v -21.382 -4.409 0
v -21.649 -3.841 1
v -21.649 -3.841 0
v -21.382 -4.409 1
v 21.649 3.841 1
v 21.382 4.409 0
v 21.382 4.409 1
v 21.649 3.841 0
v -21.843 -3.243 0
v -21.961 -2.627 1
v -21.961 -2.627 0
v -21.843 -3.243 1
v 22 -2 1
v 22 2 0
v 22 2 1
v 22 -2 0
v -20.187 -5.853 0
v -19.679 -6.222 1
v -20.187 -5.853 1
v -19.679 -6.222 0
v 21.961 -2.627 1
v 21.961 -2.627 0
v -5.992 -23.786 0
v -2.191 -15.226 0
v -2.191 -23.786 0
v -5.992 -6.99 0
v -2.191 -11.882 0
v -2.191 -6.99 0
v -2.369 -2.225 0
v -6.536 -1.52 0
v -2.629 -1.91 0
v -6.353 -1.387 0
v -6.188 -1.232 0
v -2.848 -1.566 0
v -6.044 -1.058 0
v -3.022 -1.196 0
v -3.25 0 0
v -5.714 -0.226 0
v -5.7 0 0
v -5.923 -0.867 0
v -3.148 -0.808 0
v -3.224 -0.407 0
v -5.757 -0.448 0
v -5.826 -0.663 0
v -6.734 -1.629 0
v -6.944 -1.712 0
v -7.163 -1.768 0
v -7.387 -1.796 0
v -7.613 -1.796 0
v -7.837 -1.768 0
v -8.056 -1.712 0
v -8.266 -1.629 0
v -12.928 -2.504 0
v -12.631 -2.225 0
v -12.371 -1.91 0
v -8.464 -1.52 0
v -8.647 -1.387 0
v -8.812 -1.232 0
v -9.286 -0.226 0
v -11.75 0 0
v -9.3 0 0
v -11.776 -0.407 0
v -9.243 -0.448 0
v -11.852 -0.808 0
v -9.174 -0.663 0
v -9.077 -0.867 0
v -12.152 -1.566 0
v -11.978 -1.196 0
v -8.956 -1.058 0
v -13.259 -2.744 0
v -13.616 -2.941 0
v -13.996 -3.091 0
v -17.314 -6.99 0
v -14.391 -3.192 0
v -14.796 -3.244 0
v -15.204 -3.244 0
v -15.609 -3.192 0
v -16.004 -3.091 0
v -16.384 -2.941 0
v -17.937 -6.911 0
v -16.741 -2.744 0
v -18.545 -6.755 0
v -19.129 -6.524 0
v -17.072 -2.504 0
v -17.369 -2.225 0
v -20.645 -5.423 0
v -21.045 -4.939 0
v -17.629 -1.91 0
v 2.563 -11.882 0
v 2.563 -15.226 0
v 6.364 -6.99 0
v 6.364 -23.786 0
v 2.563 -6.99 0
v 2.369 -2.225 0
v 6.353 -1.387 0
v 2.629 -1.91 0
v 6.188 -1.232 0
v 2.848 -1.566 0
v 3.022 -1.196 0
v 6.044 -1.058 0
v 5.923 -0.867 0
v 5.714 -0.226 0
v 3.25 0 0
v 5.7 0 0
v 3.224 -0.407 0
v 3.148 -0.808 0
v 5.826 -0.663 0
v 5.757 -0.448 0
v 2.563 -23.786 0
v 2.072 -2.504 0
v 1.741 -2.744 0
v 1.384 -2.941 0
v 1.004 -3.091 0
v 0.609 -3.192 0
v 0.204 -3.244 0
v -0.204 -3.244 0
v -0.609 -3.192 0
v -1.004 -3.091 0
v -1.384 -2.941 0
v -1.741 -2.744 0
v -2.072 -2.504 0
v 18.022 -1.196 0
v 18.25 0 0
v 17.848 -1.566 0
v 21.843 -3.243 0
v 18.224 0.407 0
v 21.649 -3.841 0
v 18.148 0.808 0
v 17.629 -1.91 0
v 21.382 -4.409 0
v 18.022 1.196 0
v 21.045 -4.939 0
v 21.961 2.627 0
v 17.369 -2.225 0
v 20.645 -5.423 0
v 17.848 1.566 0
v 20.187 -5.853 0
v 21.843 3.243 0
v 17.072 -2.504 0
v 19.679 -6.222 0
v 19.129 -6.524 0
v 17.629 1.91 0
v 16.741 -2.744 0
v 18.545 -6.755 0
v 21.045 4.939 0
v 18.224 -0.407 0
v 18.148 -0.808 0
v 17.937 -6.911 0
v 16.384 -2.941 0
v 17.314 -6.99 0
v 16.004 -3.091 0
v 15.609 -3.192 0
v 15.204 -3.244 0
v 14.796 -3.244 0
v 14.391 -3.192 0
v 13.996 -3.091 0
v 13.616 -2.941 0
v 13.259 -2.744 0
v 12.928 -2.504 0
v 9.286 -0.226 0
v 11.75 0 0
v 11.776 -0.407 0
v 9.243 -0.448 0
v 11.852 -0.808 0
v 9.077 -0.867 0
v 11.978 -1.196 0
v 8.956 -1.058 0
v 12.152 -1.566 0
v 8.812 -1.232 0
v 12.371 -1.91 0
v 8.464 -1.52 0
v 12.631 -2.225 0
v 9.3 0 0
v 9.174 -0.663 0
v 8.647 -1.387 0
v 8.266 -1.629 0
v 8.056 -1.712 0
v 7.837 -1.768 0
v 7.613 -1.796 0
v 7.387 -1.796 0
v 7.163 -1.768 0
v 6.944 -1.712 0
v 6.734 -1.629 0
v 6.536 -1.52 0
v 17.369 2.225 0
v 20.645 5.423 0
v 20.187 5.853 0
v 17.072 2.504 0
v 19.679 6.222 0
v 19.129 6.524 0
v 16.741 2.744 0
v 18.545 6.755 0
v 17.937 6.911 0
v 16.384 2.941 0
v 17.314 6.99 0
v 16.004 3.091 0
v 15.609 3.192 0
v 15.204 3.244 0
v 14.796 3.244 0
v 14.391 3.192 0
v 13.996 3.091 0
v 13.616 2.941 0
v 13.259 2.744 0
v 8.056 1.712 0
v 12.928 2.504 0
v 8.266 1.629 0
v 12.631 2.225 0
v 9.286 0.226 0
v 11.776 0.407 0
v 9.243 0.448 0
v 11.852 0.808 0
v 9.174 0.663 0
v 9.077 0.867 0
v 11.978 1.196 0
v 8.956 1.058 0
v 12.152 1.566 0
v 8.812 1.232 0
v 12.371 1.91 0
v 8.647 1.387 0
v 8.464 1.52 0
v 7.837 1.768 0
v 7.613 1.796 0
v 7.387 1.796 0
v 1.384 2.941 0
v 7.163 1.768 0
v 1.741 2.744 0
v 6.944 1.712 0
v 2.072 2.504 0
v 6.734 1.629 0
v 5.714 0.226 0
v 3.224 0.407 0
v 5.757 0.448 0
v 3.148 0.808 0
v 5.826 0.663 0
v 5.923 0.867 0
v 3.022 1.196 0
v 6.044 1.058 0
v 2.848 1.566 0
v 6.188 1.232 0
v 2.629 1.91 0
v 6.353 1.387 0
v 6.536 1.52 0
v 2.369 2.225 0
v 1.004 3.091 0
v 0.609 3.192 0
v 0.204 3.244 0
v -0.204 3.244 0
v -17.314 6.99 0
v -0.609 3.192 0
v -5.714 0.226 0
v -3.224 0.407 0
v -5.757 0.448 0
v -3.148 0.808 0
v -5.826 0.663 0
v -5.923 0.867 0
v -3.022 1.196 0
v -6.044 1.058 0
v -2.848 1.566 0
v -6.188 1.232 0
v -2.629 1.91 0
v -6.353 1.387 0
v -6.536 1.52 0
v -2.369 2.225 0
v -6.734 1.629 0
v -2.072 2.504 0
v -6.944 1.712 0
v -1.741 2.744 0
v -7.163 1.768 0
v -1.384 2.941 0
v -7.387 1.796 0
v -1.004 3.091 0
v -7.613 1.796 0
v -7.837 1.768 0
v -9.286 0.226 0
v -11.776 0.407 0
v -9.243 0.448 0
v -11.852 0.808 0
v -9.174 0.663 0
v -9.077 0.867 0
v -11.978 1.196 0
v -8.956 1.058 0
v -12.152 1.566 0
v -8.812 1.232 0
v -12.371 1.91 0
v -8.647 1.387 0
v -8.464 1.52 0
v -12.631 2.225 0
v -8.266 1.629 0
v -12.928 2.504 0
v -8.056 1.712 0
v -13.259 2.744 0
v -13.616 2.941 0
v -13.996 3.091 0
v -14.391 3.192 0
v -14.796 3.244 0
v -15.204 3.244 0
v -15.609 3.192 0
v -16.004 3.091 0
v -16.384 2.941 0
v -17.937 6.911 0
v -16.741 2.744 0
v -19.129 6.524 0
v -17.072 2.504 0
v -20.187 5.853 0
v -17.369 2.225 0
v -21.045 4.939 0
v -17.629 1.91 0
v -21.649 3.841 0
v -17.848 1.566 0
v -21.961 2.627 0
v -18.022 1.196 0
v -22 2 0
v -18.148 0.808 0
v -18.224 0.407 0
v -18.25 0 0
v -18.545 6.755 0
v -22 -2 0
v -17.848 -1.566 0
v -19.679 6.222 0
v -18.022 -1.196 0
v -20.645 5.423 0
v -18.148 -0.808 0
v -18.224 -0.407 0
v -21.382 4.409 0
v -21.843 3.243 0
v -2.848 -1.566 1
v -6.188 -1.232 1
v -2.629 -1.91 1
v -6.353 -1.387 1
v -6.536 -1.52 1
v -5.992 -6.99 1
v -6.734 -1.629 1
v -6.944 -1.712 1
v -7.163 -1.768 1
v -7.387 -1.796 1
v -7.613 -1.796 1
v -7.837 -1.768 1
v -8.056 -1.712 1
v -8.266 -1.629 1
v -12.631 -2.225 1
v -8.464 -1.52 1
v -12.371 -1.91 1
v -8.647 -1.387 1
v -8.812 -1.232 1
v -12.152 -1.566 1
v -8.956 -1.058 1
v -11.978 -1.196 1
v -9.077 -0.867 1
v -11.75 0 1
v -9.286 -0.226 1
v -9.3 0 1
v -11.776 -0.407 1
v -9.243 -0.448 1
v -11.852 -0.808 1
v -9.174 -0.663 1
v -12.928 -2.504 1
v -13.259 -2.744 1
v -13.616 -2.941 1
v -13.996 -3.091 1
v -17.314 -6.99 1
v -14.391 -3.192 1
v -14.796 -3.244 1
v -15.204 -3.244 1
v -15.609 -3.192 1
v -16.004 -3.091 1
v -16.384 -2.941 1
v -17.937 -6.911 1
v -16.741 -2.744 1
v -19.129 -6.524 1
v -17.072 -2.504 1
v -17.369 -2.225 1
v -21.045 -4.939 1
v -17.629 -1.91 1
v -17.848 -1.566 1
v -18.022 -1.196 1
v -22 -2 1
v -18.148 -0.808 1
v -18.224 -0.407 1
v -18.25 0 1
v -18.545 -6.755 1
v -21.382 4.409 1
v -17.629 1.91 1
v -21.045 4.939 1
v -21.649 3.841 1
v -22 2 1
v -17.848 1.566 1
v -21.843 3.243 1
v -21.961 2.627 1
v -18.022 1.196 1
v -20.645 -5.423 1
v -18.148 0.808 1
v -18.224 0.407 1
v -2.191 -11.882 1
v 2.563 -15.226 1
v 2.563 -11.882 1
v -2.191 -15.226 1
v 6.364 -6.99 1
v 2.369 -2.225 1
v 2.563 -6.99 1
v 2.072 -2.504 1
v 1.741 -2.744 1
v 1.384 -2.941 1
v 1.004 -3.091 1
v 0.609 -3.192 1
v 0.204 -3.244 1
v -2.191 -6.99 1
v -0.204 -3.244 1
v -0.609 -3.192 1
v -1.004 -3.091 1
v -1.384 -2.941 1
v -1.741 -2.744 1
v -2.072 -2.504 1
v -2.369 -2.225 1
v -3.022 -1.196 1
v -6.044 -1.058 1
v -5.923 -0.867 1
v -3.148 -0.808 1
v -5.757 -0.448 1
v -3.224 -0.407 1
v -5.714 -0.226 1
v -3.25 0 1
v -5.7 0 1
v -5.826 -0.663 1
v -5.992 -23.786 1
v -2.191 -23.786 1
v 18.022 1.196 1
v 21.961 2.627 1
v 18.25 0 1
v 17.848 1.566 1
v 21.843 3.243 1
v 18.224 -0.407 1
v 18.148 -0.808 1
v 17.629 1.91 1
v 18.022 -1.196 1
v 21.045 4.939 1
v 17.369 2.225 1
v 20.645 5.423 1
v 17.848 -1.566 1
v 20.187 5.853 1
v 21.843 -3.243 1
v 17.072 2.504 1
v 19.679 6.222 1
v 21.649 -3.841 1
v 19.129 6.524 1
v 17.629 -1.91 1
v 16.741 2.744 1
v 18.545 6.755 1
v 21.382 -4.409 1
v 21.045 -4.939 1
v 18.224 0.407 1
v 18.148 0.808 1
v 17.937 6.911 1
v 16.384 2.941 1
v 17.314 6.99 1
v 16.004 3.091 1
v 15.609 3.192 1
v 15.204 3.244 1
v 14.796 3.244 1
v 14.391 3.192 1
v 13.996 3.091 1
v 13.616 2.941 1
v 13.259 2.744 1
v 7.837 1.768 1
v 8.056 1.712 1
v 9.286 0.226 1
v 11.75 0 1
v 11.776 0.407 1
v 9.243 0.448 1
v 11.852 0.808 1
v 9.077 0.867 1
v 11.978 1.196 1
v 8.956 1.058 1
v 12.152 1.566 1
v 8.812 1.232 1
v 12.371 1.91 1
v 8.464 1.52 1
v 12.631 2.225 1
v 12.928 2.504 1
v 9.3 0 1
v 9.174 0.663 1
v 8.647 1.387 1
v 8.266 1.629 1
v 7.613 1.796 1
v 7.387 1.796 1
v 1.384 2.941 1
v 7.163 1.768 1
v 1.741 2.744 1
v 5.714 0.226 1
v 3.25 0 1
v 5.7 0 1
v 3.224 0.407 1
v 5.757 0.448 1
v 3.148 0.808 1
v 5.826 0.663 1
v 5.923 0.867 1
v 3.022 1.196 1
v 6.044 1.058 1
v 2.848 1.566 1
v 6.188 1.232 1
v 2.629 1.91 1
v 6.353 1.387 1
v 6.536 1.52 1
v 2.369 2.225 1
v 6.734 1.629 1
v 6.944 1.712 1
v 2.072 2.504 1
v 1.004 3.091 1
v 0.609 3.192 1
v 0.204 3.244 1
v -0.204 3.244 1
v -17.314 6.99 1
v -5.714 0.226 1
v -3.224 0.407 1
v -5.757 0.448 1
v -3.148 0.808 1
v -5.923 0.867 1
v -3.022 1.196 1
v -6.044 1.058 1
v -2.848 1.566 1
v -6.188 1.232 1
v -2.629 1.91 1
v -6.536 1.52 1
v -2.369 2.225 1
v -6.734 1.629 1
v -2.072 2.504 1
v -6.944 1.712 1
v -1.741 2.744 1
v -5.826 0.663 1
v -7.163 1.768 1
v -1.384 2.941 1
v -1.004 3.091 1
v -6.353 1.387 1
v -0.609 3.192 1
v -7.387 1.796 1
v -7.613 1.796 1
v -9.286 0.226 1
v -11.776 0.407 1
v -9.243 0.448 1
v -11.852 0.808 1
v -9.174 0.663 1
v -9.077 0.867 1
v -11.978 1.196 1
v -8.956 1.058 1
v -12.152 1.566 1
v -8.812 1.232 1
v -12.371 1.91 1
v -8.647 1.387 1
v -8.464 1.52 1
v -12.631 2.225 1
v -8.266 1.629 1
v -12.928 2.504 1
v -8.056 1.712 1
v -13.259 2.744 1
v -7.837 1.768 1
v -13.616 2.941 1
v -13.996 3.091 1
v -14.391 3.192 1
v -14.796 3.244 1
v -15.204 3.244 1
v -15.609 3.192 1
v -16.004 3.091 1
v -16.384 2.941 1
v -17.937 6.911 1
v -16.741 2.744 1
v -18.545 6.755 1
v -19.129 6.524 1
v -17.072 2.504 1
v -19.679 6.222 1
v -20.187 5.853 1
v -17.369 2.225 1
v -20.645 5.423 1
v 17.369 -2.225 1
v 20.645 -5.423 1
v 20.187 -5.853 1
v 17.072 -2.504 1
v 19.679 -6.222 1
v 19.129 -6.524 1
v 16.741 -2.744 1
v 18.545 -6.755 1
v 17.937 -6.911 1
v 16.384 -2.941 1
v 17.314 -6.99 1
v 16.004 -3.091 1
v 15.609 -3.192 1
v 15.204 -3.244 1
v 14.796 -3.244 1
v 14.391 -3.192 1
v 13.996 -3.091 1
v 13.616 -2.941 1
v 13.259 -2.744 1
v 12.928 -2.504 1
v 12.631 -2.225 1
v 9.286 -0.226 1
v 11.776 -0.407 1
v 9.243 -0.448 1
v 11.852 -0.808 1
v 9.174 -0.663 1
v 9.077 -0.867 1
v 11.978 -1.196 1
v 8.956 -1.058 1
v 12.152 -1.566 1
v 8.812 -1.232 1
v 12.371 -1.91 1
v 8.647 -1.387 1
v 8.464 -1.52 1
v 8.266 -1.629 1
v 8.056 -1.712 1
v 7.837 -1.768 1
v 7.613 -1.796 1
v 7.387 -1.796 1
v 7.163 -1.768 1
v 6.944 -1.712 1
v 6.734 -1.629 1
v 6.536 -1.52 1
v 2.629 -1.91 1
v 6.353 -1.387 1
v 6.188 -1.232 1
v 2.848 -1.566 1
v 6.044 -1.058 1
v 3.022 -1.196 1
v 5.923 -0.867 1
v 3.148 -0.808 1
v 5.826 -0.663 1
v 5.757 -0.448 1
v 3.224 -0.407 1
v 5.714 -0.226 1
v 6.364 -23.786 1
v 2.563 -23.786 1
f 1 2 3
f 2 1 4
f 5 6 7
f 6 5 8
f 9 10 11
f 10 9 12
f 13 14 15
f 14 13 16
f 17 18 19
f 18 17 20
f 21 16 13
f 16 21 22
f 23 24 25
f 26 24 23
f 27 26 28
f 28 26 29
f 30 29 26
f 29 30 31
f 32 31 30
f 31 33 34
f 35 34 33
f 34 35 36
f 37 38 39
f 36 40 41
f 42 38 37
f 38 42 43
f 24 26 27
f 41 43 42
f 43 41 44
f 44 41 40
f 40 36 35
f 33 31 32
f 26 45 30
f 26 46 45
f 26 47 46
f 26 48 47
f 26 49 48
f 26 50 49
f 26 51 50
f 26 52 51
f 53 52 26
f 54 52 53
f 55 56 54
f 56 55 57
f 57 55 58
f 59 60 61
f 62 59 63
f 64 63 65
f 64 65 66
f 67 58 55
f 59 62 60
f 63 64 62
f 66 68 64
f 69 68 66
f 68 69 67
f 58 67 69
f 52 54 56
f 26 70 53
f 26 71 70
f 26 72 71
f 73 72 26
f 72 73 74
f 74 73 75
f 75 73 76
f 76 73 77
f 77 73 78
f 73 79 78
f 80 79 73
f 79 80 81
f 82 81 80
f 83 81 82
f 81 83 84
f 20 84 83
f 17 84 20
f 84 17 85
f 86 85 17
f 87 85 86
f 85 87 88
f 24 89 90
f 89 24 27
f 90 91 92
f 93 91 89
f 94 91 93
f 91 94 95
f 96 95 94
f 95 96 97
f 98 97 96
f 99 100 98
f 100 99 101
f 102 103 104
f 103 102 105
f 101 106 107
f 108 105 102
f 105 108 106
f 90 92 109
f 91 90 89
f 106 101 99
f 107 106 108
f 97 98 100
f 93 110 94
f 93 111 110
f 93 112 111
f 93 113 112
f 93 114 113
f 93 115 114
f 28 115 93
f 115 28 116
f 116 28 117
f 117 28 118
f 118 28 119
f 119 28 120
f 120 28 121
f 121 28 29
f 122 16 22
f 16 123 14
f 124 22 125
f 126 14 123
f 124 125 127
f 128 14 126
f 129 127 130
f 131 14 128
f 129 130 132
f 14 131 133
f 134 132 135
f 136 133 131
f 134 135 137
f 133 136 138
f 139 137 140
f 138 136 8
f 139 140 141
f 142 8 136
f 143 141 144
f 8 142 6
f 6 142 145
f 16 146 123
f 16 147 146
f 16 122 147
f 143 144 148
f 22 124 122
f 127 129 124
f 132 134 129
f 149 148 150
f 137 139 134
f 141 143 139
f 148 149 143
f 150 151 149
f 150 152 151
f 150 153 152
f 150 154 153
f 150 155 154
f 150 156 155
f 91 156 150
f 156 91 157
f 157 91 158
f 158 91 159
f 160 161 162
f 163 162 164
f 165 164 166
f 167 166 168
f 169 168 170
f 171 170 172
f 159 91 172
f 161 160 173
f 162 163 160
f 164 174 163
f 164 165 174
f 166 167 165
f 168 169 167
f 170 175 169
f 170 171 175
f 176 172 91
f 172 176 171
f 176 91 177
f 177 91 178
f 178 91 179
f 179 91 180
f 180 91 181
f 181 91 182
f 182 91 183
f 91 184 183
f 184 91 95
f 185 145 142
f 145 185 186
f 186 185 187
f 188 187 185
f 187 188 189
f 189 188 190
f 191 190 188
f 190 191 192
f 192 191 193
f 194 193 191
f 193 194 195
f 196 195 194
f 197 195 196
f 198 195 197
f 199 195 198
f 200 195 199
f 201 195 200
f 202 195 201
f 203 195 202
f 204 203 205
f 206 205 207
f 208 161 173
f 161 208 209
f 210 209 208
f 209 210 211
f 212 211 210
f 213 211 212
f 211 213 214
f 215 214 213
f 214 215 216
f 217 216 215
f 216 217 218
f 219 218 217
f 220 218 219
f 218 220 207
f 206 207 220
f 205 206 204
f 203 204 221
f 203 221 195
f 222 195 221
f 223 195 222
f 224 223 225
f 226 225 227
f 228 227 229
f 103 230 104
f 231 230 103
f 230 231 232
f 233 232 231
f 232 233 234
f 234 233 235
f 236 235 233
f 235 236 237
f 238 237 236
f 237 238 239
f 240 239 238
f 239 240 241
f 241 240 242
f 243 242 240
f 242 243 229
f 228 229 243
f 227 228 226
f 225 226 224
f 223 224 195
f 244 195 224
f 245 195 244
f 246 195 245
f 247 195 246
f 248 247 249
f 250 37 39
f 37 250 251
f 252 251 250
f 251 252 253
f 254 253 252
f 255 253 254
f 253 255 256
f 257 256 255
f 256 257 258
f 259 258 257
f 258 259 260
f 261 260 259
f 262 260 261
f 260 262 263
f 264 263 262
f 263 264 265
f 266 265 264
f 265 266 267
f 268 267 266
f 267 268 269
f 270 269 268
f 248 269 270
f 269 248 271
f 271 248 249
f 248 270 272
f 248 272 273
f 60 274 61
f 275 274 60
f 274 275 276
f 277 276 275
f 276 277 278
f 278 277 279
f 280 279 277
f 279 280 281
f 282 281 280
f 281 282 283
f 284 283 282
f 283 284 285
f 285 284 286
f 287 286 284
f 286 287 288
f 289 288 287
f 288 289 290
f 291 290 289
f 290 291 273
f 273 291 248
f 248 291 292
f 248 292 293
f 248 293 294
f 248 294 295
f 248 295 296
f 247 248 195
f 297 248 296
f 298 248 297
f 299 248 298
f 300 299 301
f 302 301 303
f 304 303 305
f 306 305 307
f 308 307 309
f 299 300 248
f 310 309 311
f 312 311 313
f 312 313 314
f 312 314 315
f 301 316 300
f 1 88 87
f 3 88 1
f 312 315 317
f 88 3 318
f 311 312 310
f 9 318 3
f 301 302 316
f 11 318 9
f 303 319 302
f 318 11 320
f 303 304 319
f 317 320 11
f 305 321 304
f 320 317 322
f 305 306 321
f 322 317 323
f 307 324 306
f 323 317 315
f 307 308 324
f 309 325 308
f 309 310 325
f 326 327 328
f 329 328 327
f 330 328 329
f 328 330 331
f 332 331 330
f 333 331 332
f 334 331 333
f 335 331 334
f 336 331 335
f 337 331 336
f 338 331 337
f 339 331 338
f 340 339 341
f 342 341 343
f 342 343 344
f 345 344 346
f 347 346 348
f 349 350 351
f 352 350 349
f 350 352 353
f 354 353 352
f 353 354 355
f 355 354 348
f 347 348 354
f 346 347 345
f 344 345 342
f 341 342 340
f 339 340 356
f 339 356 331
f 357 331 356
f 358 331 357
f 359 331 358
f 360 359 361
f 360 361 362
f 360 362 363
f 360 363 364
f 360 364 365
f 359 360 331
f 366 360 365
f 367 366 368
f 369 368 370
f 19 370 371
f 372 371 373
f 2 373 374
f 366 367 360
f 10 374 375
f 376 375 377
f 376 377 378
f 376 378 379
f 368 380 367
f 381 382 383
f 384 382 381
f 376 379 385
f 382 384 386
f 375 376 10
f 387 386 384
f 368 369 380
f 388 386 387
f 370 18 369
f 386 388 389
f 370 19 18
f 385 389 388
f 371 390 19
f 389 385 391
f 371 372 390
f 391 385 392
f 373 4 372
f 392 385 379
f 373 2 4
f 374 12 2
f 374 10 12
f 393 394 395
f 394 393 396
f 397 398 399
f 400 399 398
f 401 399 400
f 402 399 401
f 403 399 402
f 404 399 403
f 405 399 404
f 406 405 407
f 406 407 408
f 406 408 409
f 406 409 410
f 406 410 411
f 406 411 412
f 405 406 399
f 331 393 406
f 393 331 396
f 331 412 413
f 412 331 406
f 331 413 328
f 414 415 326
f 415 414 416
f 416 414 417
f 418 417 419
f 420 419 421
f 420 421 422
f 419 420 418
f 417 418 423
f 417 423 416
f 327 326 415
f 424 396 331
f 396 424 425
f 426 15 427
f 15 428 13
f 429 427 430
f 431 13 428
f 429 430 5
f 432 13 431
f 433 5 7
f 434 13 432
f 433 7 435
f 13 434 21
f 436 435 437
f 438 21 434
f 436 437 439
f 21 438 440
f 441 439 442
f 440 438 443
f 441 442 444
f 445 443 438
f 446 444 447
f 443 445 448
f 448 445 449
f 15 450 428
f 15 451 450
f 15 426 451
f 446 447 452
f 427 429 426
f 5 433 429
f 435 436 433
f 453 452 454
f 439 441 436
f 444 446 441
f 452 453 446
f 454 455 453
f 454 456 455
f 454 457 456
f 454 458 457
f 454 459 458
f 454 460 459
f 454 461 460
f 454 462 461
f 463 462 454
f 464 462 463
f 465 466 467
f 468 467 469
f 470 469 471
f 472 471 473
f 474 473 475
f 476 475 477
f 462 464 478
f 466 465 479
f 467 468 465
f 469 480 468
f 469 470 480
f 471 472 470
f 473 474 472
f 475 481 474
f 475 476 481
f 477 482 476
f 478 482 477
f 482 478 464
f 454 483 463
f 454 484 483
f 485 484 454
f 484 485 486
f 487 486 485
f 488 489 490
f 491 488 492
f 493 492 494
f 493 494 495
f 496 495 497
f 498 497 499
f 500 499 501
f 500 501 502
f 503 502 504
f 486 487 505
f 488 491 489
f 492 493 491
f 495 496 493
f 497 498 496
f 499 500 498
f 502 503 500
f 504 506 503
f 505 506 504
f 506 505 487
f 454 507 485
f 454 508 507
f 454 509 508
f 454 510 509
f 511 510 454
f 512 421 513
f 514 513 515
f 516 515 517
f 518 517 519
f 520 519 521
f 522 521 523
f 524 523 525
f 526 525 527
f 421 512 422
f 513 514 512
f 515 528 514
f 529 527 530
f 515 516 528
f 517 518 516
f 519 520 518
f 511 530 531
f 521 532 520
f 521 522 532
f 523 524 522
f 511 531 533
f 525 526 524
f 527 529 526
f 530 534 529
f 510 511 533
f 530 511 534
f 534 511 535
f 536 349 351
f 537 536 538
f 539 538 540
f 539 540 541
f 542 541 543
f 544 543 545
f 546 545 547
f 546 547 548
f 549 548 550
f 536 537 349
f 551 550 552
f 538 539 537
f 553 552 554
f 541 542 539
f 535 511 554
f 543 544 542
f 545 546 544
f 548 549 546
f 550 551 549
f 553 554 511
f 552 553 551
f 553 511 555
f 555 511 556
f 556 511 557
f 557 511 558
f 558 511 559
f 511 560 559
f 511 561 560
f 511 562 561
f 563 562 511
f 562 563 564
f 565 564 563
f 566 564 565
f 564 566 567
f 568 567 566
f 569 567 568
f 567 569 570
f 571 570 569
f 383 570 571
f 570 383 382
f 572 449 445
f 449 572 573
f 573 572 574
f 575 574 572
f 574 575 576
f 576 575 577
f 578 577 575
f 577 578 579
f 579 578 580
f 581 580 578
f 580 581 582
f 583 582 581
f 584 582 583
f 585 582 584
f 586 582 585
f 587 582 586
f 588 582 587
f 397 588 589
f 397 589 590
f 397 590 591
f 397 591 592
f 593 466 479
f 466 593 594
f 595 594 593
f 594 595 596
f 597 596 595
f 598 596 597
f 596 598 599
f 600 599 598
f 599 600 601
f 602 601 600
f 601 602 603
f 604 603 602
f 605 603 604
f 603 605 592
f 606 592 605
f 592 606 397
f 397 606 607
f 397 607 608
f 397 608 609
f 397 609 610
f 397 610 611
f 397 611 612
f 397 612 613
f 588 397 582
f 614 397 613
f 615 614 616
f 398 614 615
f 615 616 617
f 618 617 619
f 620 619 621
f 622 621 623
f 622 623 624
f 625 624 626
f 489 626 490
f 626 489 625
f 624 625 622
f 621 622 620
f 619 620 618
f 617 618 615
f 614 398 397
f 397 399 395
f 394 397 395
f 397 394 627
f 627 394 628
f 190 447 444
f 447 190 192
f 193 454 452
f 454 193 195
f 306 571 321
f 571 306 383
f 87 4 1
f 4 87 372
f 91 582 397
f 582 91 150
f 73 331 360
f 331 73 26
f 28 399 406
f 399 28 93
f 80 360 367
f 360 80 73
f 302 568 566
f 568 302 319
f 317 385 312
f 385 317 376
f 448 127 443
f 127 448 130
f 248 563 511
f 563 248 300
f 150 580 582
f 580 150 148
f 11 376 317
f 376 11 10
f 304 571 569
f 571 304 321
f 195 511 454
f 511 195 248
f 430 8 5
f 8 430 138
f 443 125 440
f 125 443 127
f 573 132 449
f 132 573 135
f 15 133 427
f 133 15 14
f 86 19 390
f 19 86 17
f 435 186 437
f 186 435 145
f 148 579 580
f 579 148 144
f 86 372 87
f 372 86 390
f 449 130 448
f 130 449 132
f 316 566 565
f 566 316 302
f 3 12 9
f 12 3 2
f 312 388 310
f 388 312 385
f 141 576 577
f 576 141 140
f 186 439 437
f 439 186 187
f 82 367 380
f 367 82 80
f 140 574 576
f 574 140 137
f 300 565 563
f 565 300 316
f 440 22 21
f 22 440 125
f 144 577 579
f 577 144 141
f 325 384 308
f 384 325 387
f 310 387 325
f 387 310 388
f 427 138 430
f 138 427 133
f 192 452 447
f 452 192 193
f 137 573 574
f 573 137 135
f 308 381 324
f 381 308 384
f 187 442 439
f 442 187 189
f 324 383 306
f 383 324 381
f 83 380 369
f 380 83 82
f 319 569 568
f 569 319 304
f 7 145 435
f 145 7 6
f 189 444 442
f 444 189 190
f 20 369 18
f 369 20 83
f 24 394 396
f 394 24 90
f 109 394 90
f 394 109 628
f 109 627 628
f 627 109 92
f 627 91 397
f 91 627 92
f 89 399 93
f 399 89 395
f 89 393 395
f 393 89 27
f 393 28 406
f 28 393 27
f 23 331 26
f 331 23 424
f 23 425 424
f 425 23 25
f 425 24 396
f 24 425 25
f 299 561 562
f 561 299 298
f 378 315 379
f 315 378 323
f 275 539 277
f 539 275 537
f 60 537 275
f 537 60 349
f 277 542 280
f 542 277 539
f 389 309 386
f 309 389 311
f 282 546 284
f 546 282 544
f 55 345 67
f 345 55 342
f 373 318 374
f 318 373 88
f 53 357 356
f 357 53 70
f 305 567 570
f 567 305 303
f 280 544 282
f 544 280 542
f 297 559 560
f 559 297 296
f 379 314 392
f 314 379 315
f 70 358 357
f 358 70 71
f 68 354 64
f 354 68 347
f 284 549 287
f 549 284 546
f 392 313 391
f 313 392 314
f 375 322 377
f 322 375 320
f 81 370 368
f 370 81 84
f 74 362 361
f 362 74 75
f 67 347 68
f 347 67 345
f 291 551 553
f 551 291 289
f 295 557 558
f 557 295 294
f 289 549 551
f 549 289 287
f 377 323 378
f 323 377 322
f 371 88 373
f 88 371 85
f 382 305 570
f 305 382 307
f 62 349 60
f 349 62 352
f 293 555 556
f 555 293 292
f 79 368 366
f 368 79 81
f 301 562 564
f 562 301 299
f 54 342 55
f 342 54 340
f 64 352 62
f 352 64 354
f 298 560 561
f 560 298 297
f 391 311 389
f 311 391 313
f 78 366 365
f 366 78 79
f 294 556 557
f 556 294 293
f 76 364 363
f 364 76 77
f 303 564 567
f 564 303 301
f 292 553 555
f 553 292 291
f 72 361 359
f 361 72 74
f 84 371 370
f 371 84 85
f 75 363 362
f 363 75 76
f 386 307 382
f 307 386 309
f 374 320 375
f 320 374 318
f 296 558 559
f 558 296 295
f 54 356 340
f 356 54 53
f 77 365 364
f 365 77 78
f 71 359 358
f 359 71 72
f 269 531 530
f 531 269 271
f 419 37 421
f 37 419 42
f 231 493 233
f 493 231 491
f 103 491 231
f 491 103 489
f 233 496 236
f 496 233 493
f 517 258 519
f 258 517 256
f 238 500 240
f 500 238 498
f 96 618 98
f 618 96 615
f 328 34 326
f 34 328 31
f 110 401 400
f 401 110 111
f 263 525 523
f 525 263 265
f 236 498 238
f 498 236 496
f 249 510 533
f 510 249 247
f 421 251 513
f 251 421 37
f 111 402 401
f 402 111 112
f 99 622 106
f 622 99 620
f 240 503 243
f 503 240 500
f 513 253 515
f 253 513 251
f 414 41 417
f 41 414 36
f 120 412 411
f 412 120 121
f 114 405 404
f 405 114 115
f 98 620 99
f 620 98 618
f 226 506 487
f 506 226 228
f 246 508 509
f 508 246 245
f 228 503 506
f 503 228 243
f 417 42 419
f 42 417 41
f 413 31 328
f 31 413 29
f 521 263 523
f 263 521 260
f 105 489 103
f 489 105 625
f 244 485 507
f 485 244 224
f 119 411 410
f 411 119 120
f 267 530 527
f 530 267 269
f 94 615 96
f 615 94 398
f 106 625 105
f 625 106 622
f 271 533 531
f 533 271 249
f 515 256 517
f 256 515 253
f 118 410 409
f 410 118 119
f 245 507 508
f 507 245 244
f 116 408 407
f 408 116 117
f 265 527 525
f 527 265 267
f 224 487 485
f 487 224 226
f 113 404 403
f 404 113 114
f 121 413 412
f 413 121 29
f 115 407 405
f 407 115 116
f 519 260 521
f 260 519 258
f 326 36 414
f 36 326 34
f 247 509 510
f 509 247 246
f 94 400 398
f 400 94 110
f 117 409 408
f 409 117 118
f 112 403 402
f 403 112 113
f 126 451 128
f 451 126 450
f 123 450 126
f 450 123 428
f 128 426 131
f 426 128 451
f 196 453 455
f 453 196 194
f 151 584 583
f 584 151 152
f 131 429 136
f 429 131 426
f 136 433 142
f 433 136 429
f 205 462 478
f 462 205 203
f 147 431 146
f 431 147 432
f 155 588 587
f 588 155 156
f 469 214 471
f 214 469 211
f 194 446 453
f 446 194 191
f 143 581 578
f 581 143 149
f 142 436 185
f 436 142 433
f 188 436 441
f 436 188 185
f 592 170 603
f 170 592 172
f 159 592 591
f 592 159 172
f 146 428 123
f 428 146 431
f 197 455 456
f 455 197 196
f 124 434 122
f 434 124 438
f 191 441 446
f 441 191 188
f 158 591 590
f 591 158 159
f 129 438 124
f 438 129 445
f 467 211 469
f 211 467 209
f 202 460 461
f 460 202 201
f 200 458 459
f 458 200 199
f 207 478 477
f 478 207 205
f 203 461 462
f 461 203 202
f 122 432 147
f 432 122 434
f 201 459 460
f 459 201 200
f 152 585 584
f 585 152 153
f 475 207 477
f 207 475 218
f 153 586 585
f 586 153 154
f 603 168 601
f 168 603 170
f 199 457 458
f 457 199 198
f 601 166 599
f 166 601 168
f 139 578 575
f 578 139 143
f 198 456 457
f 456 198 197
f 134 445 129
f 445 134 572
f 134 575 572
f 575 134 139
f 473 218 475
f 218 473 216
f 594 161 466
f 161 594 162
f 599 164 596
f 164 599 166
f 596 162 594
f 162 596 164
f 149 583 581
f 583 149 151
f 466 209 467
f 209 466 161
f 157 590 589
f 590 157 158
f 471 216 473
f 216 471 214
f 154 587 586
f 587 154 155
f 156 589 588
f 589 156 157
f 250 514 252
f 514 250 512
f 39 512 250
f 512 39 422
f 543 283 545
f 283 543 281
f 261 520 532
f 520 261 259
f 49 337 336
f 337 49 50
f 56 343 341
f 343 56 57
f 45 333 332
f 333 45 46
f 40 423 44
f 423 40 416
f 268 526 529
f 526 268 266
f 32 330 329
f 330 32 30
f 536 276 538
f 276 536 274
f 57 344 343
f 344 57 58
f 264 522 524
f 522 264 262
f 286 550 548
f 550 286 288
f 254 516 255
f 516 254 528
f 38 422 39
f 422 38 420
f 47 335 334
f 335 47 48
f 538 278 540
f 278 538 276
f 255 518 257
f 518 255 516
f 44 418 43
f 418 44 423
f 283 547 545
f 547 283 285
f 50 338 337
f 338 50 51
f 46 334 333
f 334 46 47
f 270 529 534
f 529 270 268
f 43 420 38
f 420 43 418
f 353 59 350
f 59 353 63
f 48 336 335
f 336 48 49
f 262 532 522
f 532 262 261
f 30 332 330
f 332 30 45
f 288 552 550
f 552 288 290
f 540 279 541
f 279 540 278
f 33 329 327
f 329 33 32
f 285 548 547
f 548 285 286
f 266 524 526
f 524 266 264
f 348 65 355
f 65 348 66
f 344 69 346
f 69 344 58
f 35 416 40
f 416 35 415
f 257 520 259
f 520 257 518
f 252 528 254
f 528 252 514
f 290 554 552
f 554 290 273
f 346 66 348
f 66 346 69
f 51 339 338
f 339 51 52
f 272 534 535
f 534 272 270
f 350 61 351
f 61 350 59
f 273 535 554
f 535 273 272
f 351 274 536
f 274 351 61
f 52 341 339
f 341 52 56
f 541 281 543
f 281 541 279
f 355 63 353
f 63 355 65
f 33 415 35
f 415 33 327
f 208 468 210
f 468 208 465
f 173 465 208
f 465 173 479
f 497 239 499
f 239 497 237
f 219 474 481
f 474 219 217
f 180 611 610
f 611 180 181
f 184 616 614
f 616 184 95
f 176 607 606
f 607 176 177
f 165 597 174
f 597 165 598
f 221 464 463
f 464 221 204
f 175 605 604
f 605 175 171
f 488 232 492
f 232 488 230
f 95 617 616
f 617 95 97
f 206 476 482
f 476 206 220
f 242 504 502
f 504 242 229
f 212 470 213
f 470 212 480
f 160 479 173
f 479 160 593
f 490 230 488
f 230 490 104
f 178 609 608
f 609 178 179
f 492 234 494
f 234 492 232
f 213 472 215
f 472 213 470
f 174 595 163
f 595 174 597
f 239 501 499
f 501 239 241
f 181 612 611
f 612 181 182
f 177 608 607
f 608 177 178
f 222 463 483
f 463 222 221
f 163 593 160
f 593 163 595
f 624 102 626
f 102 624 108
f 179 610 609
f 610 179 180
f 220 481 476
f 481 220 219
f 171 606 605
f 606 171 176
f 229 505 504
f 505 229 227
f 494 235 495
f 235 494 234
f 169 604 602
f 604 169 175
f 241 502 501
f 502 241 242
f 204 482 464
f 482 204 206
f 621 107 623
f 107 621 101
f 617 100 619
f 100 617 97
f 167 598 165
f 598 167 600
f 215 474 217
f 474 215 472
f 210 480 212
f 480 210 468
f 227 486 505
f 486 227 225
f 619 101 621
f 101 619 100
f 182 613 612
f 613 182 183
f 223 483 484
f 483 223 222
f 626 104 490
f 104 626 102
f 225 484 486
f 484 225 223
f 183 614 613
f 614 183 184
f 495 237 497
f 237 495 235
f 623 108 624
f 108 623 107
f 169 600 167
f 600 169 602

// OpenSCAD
$fn = 50;


difference() {
	union() {
		hull() {
			translate(v = [-17.0000000000, 2.0000000000, 0]) {
				cylinder(h = 1, r = 5);
			}
			translate(v = [17.0000000000, 2.0000000000, 0]) {
				cylinder(h = 1, r = 5);
			}
			translate(v = [-17.0000000000, -2.0000000000, 0]) {
				cylinder(h = 1, r = 5);
			}
			translate(v = [17.0000000000, -2.0000000000, 0]) {
				cylinder(h = 1, r = 5);
			}
		}
		translate(v = [0, -5, 0]) {
			linear_extrude(height = 1) {
				text(font = "DejaVu Sans Mono:style=Bold", halign = "center", size = 19.0000000000, text = "H", valign = "top");
			}
		}
	}
	union() {
		translate(v = [-15.0000000000, 0.0000000000, 0]) {
			translate(v = [0, 0, -100]) {
				cylinder(h = 200, r = 3.2500000000);
			}
		}
		translate(v = [0, 0, -100]) {
			cylinder(h = 200, r = 3.2500000000);
		}
		translate(v = [15.0000000000, 0.0000000000, 0]) {
			translate(v = [0, 0, -100]) {
				cylinder(h = 200, r = 3.2500000000);
			}
		}
		translate(v = [-15.0000000000, 0.0000000000, 0]) {
			translate(v = [0, 0, -100]) {
				cylinder(h = 200, r = 1.8000000000);
			}
		}
		translate(v = [-7.5000000000, 0.0000000000, 0]) {
			translate(v = [0, 0, -100]) {
				cylinder(h = 200, r = 1.8000000000);
			}
		}
		translate(v = [0, 0, -100]) {
			cylinder(h = 200, r = 1.8000000000);
		}
		translate(v = [7.5000000000, 0.0000000000, 0]) {
			translate(v = [0, 0, -100]) {
				cylinder(h = 200, r = 1.8000000000);
			}
		}
		translate(v = [15.0000000000, 0.0000000000, 0]) {
			translate(v = [0, 0, -100]) {
				cylinder(h = 200, r = 1.8000000000);
			}
		}
	}
}
